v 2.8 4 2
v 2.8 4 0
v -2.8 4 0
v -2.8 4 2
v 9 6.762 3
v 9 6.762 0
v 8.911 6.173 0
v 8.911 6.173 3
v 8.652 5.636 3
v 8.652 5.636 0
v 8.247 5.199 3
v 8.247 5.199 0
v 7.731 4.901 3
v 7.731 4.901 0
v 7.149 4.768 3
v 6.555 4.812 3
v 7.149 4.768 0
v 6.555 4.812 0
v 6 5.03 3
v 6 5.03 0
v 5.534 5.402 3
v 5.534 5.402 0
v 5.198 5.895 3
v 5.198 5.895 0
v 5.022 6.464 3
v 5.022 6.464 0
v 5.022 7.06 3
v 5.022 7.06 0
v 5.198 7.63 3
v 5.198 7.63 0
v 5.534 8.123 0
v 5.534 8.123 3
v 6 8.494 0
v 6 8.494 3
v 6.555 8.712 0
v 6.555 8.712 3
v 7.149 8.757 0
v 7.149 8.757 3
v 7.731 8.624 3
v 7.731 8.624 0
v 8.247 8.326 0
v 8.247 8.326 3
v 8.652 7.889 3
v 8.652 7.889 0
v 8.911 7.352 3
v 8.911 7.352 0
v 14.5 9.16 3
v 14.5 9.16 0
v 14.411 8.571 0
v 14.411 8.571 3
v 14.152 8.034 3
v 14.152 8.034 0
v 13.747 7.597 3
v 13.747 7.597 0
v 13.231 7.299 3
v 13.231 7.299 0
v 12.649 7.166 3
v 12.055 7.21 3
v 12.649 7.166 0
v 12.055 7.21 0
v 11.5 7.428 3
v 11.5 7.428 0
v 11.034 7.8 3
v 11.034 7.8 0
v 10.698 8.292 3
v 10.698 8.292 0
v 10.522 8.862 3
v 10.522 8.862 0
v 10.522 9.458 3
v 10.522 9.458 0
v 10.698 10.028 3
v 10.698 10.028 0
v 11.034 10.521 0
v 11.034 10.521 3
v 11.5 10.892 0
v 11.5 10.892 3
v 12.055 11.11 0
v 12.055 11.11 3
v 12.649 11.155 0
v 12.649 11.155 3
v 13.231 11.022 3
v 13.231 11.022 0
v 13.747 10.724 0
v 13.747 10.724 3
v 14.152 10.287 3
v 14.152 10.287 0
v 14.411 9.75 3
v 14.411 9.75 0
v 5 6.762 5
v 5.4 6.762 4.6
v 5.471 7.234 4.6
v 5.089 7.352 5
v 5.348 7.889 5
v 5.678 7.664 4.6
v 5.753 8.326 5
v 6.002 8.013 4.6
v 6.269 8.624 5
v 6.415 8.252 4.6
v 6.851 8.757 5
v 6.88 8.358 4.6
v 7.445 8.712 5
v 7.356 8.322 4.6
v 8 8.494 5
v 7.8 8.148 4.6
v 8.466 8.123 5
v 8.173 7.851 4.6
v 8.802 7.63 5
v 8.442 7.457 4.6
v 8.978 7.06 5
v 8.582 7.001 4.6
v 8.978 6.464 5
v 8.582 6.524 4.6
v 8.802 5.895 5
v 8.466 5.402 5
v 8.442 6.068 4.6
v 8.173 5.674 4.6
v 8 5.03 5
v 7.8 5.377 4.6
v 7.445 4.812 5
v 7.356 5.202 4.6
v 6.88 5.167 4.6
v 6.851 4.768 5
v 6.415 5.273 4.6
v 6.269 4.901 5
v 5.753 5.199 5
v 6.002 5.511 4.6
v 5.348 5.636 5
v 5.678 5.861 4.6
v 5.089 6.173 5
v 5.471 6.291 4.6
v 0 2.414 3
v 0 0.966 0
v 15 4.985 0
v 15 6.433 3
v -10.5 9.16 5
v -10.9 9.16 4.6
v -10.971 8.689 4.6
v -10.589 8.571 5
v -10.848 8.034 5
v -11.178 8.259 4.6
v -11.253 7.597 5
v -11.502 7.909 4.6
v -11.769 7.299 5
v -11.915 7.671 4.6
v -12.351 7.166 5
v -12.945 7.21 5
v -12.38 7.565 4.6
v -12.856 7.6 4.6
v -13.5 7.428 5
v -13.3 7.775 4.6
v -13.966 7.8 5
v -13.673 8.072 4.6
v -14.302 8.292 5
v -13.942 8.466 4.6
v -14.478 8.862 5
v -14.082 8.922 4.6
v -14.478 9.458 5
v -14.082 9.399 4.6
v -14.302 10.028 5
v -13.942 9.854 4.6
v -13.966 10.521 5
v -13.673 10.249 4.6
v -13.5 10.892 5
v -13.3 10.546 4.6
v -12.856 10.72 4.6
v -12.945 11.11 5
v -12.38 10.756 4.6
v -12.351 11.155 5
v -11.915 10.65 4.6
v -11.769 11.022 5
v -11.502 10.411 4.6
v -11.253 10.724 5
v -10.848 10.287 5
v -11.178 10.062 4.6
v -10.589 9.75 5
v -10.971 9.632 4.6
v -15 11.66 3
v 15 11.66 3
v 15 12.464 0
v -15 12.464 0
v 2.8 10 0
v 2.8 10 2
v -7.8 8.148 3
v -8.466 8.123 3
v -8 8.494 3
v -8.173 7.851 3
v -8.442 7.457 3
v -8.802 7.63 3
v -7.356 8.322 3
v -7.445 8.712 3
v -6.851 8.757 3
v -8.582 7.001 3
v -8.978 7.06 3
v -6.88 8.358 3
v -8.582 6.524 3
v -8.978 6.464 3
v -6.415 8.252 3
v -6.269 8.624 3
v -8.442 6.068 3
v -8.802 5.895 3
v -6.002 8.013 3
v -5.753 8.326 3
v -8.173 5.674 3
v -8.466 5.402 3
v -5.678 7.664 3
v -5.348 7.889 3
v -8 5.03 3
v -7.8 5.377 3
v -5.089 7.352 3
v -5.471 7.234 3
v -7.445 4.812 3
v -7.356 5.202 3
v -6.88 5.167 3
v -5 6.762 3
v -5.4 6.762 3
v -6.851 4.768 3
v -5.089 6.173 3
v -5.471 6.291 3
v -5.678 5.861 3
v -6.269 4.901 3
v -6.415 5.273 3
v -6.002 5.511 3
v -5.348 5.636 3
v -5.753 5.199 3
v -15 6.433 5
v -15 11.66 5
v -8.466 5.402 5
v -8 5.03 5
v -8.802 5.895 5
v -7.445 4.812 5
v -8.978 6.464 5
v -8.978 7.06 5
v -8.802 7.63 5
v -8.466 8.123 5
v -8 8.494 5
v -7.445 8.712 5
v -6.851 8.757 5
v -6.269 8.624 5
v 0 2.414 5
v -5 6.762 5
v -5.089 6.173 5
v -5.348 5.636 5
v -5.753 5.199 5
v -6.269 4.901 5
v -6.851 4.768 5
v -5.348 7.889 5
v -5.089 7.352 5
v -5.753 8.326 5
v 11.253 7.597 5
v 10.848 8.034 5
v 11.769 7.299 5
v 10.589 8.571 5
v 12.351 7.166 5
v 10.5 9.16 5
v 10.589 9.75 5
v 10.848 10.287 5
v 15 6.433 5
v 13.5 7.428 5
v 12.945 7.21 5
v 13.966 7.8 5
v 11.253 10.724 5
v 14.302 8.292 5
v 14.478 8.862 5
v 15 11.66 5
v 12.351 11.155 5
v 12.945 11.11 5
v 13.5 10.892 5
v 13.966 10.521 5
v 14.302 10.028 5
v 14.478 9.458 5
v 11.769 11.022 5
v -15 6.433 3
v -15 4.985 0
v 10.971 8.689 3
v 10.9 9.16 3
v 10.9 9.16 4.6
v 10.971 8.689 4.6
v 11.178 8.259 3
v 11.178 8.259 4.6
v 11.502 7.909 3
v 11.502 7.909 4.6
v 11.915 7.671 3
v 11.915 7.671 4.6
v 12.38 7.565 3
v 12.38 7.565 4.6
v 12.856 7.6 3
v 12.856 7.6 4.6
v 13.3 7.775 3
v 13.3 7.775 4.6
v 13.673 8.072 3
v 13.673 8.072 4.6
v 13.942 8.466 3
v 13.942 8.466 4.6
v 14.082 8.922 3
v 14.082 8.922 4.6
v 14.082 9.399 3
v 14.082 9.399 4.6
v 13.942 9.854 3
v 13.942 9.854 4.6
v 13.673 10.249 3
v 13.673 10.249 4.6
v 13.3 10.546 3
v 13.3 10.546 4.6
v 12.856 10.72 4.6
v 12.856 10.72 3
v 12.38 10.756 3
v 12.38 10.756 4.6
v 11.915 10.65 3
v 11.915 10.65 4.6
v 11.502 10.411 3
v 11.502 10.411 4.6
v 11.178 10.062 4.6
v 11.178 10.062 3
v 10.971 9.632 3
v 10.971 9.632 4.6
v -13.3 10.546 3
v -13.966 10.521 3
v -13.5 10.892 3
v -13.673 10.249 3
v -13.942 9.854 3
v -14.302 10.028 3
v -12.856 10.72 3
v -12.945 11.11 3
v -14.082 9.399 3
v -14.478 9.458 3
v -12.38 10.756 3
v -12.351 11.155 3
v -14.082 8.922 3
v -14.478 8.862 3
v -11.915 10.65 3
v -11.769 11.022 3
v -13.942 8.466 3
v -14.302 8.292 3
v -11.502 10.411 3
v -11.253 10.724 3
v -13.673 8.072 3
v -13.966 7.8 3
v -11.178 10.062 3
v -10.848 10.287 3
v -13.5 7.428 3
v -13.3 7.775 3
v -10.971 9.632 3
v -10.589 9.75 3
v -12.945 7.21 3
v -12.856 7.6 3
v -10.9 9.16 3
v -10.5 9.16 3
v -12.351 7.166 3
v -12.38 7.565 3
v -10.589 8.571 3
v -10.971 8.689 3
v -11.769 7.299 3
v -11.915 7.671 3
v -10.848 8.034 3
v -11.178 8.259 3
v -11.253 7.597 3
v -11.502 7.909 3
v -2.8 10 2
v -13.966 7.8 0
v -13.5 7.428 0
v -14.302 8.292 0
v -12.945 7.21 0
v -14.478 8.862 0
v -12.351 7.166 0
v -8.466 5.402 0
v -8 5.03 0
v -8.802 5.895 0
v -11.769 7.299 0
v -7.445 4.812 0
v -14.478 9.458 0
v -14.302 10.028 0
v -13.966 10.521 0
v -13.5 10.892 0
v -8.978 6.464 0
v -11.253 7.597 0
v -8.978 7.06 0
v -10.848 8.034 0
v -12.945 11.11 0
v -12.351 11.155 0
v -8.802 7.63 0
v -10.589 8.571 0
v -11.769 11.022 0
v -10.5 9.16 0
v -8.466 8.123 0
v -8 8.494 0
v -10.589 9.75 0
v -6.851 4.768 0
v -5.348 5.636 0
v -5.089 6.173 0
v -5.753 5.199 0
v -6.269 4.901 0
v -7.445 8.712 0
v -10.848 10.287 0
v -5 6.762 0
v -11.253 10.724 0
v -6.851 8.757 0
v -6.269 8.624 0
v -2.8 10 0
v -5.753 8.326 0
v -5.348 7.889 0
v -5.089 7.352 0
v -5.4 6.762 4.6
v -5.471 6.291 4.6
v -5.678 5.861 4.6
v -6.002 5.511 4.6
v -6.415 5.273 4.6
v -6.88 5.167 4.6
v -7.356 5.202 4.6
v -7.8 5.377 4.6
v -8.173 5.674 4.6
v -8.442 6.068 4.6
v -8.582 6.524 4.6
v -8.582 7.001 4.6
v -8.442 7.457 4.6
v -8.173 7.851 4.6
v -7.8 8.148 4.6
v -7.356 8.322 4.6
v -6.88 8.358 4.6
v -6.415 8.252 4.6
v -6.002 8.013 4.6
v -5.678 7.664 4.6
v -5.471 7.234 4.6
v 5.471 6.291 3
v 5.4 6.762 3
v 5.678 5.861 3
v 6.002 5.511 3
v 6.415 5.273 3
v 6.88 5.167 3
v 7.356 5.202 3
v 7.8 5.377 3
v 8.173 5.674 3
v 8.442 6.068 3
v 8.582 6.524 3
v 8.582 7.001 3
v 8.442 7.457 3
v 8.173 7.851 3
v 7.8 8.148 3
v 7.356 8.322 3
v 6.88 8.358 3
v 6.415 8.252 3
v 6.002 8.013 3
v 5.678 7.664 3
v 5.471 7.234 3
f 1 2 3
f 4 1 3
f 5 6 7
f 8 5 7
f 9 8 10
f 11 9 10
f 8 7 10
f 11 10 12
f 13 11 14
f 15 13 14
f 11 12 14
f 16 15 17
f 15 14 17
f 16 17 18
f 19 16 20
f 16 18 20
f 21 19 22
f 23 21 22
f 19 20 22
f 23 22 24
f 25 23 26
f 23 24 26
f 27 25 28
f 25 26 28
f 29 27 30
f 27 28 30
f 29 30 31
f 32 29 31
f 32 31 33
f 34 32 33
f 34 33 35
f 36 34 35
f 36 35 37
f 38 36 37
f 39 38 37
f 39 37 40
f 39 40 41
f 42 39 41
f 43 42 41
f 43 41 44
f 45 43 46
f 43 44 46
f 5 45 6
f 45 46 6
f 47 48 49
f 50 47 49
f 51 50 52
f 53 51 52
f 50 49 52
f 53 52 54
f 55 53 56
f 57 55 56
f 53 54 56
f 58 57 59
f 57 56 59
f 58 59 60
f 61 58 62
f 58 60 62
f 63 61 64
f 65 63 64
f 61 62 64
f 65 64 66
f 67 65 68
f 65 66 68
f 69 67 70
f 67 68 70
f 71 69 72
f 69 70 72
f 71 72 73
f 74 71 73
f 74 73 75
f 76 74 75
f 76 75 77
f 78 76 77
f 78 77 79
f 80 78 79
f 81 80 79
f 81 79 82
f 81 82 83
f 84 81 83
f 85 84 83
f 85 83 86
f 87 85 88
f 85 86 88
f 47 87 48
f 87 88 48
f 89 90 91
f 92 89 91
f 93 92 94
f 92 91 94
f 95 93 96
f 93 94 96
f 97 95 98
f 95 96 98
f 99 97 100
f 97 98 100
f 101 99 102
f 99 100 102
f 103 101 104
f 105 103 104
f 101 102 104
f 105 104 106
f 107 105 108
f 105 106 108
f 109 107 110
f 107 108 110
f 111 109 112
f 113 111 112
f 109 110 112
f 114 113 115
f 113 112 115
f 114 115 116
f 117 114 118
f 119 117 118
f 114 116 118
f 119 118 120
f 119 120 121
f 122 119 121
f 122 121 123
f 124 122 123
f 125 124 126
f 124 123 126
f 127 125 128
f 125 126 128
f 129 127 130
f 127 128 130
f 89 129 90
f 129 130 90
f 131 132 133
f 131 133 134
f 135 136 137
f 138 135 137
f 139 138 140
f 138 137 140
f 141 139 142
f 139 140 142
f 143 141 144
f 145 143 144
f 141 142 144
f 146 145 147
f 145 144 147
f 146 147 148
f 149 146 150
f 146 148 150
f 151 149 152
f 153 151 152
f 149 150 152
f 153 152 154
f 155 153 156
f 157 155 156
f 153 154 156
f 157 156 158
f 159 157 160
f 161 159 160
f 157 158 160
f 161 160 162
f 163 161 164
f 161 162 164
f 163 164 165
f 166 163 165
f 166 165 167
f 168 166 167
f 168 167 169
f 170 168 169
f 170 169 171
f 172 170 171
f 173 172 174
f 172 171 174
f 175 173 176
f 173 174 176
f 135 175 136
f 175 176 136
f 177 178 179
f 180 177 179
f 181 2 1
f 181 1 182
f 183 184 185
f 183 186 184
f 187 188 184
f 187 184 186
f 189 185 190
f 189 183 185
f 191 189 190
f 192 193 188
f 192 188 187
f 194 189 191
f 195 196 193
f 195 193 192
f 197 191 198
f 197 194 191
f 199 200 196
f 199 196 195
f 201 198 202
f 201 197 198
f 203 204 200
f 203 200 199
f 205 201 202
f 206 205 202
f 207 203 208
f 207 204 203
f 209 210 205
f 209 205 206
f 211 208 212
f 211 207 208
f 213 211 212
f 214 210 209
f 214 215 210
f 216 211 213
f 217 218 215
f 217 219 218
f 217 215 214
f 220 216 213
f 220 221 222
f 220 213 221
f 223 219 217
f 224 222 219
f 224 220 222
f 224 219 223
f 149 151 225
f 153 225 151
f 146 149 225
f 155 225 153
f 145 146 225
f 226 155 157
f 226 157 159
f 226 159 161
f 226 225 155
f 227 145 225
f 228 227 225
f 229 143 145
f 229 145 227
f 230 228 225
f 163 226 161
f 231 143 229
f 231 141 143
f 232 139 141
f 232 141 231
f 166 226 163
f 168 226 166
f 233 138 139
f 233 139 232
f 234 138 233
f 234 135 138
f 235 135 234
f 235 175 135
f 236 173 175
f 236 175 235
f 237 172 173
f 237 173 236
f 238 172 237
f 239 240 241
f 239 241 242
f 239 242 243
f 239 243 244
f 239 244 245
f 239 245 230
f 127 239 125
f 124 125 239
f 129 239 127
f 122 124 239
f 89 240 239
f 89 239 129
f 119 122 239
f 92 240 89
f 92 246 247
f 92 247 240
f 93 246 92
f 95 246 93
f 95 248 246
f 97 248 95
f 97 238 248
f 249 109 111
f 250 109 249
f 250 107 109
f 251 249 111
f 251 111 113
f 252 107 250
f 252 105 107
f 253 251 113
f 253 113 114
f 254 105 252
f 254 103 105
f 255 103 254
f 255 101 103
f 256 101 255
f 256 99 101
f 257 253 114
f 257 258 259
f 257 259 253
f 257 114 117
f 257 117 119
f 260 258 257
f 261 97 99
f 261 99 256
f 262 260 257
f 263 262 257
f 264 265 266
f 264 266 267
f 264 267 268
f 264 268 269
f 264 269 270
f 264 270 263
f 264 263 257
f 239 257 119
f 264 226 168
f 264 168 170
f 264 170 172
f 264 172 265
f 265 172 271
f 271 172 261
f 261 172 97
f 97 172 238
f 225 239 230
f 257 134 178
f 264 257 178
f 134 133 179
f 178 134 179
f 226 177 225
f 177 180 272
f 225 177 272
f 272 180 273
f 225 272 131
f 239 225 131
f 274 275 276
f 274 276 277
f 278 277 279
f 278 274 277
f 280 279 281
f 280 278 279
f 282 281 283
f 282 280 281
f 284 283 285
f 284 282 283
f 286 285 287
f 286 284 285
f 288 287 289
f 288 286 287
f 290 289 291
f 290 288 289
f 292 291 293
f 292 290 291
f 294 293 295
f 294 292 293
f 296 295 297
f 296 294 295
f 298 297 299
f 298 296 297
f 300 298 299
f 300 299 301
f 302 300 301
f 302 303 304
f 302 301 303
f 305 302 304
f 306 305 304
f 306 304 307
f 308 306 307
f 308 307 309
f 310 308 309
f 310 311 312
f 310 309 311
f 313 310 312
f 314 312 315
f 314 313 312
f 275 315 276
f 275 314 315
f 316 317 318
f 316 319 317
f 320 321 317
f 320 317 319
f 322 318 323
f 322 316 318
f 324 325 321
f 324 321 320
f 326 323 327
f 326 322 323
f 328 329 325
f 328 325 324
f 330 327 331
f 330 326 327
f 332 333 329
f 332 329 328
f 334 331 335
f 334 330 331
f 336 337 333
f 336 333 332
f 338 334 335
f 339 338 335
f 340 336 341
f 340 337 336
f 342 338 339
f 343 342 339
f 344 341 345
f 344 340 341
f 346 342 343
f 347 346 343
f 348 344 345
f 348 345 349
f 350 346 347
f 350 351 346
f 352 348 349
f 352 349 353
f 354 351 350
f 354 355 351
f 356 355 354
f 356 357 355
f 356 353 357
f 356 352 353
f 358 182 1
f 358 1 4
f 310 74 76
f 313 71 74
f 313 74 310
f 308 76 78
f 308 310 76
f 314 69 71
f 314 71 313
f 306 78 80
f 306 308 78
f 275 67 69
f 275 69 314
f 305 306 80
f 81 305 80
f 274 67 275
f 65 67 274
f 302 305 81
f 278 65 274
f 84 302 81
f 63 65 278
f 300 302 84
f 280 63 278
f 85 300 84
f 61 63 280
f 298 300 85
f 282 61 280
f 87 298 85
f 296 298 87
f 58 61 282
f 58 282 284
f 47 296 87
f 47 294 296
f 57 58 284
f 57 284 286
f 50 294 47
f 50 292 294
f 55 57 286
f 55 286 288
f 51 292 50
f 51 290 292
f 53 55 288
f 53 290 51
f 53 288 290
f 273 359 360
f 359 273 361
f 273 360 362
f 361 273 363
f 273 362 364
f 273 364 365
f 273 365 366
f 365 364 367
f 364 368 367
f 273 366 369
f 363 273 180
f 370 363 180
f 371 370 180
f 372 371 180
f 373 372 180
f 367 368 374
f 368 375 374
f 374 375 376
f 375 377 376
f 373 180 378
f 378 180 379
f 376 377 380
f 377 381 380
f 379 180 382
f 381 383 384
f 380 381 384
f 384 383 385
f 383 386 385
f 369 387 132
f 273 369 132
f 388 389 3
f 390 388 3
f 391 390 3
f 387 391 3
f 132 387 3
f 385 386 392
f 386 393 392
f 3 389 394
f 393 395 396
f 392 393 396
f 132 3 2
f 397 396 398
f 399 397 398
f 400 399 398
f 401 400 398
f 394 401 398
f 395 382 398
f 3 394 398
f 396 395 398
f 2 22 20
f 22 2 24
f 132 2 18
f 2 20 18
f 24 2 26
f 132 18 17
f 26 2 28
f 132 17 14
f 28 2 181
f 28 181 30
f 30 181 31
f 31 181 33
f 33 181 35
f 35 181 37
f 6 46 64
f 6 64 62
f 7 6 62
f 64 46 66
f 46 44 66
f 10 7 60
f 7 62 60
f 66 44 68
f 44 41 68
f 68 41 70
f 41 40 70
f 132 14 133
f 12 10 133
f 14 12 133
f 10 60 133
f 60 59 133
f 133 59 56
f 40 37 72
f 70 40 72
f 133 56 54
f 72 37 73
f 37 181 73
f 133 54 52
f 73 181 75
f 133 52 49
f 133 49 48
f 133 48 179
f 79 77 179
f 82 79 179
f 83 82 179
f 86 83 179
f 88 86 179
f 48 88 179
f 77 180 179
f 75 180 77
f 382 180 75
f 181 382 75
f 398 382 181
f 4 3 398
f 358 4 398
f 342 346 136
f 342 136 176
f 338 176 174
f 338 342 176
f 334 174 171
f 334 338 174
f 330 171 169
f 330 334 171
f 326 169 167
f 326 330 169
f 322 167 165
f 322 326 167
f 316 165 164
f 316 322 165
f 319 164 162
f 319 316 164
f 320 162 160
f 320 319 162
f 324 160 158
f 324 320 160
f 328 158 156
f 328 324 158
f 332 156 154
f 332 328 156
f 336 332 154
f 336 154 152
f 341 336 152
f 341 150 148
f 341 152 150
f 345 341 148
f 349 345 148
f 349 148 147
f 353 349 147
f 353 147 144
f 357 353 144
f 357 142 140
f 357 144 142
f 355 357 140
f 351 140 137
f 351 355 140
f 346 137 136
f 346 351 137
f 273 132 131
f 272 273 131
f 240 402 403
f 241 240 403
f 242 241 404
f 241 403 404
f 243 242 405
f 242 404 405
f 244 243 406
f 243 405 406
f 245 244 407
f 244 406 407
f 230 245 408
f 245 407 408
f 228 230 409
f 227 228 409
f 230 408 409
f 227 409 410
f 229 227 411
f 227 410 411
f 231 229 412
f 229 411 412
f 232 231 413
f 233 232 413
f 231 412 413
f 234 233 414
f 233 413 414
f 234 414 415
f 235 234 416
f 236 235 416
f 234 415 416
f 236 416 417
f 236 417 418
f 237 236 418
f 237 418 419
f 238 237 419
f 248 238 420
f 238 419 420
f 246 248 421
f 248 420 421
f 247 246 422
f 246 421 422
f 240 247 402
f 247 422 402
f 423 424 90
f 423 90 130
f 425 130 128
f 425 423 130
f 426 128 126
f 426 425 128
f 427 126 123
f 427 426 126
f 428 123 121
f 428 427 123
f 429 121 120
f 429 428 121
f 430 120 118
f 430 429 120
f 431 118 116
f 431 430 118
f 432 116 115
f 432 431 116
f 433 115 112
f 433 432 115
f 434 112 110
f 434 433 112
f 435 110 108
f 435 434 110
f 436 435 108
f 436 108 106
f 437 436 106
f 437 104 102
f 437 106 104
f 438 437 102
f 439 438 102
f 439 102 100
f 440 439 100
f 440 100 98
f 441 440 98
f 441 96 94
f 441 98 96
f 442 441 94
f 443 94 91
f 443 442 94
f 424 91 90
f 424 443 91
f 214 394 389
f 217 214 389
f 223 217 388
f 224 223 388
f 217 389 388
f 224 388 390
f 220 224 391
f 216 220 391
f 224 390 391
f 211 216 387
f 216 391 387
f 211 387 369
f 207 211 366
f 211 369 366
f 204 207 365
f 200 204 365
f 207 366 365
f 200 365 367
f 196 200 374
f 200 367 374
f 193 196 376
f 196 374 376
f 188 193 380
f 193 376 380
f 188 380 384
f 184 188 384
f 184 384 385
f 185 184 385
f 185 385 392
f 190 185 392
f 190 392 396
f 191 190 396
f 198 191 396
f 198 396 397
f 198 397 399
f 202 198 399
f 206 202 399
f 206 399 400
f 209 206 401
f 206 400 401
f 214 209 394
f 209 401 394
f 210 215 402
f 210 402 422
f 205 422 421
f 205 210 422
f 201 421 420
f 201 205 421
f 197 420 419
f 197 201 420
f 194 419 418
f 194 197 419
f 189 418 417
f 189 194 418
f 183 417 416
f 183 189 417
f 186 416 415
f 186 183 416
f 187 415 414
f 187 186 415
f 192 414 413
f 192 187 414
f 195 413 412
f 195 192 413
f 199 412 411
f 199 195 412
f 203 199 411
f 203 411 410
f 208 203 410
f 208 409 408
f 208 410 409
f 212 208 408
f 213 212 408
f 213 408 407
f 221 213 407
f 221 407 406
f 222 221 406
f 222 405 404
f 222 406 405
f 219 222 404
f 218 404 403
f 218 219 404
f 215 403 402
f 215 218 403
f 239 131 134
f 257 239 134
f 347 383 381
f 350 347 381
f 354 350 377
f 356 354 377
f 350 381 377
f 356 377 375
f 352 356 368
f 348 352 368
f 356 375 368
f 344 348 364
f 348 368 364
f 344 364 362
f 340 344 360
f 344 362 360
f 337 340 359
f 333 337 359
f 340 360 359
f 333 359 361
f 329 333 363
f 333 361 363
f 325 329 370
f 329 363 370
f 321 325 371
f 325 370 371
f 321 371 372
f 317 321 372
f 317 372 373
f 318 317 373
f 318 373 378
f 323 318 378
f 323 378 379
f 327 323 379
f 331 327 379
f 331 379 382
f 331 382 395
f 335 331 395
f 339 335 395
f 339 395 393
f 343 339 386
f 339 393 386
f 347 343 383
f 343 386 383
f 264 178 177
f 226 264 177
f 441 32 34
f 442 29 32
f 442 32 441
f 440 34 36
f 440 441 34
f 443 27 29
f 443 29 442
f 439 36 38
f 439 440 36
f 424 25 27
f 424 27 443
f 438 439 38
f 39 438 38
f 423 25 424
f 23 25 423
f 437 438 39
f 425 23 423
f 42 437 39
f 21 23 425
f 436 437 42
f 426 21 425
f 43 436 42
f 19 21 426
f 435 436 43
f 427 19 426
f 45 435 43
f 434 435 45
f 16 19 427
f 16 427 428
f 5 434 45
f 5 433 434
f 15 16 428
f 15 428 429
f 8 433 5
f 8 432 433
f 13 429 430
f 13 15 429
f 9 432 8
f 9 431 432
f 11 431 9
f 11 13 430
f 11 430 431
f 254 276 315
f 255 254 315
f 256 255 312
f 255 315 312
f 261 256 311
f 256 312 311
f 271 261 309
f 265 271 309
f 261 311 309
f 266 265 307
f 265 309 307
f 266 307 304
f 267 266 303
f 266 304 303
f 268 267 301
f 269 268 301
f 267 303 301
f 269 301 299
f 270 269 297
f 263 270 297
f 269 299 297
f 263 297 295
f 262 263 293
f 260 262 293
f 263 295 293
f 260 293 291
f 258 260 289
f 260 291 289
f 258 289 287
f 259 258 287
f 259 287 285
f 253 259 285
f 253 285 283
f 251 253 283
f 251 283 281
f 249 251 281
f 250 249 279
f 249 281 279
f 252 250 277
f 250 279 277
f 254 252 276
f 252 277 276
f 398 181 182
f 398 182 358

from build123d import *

# Parameters (mm, degrees)
RESSALTO_EXTRUS_O1_DEPTH   = 3
CHANFRO1_SIZE              = 5
CHANFRO1_SIZE_2            = 2.331538291
CHANFRO2_SIZE              = 1.339745962
CHANFRO2_SIZE_2            = 5
RESSALTO_EXTRUS_O2_DEPTH   = 2
CORTE_EXTRUS_O1_DEPTH      = 21.133400832
CORTE_EXTRUS_O1_DEPTH_BACK = 21.133400832
ESBO_O3_R                  = 1.6
ESBO_O4_R                  = 2
CORTE_EXTRUS_O2_DEPTH      = 3
ESBO_O6_W                  = 5.6
ESBO_O6_H                  = 6
CORTE_EXTRUS_O3_DEPTH      = 2
CHANFRO3_SIZE              = 0.4


with BuildPart() as part:
    # Esboço1 → Ressalto-extrusão1 (new body)
    with BuildSketch(Plane.XY):
        Polygon((-15, 13), (-15, 4.019237886), (0, 0), (15, 4.019237886), (15, 13), align=None)
    extrude(amount=RESSALTO_EXTRUS_O1_DEPTH)

    # Chanfro1
    # the kernel refuses this chamfer: 5, 2.331538291 mm, written as the material it takes off along each edge
    with BuildSketch(Plane(origin=(-27.513450616, 7.372206873, 3), x_dir=(-0.00422163992492442, -0.015755374691079384, -0.9998669641130704), z_dir=(0.9659258262890691, -0.25881904510251785, 0)), Plane(origin=(-12.513450616, -3.352968987, 3), x_dir=(0.004221639924924417, -0.015755374691079373, -0.9998669641130704), z_dir=(0.9659258262890691, 0.25881904510251785, 0))) as chanfro1_piece_1:
        Polygon((CHANFRO1_SIZE * 0.999866964113, CHANFRO1_SIZE * 0.0163111641311), (-CHANFRO1_SIZE_2 * 0.0163111641295, CHANFRO1_SIZE_2 * 0.999866964017), (0, 0), align=None)
    extrude(amount=41.43889742, mode=Mode.SUBTRACT)

    # Chanfro2
    # the kernel refuses this chamfer: 5, 1.339745962 mm, written as the material it takes off along each edge
    with BuildSketch(Plane(origin=(27.983607851, 13, 3), x_dir=(0, -0.9905000388259543, 0.13751244702128929), z_dir=(-1, 0, 0))) as chanfro2_piece_1:
        Polygon((CHANFRO2_SIZE * 0.990500038941, -CHANFRO2_SIZE * 0.137512447037), (-CHANFRO2_SIZE_2 * 0.137512447021, -CHANFRO2_SIZE_2 * 0.990500038826), (0, 0), align=None)
    extrude(amount=55.967215702, mode=Mode.SUBTRACT)

    # Esboço2 → Ressalto-extrusão2 (add)
    with BuildSketch(Plane.XY.offset(3)):
        Polygon((0, 2.413786056), (15, 6.433023943), (15, 11.660254038), (-15, 11.660254038), (-15, 6.433023943), align=None)
    extrude(amount=RESSALTO_EXTRUS_O2_DEPTH)

    # Esboço3 → Corte-extrusão1 (cut, two sides: drawn at the far end of the back side and taken through both)
    with BuildSketch(Plane.XY.offset(-CORTE_EXTRUS_O1_DEPTH_BACK)):
        with Locations((-7, 6.762338276)):
            Circle(ESBO_O3_R)
        with Locations(Location((7, 6.762338276, 0), (0, 0, 180))):
            Circle(ESBO_O3_R)
        with Locations((-12.5, 9.160254038)):
            Circle(ESBO_O3_R)
        with Locations(Location((12.5, 9.160254038, 0), (0, 0, 180))):
            Circle(ESBO_O3_R)
    extrude(amount=CORTE_EXTRUS_O1_DEPTH + CORTE_EXTRUS_O1_DEPTH_BACK, mode=Mode.SUBTRACT)

    # Esboço4 → Corte-extrusão2 (cut)
    with BuildSketch(Plane(origin=(0, 0, 0), x_dir=(-1, 0, 0), z_dir=(0, 0, -1))):
        with Locations(Location((-7, 6.762338276, 0), (0, 0, 180))):
            Circle(ESBO_O4_R)
        with Locations(Location((12.5, 9.160254038, 0), (0, 0, 180))):
            Circle(ESBO_O4_R)
        with Locations(Location((-12.5, 9.160254038, 0), (0, 0, 180))):
            Circle(ESBO_O4_R)
        with Locations(Location((7, 6.762338276, 0), (0, 0, 180))):
            Circle(ESBO_O4_R)
    extrude(amount=-CORTE_EXTRUS_O2_DEPTH, mode=Mode.SUBTRACT)

    # Esboço6 → Corte-extrusão3 (cut)
    with BuildSketch(Plane(origin=(0, 0, 0), x_dir=(-1, 0, 0), z_dir=(0, 0, -1))):
        with Locations((0, 7)):
            Rectangle(ESBO_O6_W, ESBO_O6_H)
    extrude(amount=-CORTE_EXTRUS_O3_DEPTH, mode=Mode.SUBTRACT)

    # Chanfro3
    chanfro3_edges = [part.edges().sort_by_distance(p)[0] for p in [
        (14.1, 9.160254038, 5),
        (-14.1, 9.160254038, 5),
        (8.6, 6.762338276, 5),
        (-8.6, 6.762338276, 5),
    ]]
    chamfer(chanfro3_edges, length=CHANFRO3_SIZE)


solid = part.part
